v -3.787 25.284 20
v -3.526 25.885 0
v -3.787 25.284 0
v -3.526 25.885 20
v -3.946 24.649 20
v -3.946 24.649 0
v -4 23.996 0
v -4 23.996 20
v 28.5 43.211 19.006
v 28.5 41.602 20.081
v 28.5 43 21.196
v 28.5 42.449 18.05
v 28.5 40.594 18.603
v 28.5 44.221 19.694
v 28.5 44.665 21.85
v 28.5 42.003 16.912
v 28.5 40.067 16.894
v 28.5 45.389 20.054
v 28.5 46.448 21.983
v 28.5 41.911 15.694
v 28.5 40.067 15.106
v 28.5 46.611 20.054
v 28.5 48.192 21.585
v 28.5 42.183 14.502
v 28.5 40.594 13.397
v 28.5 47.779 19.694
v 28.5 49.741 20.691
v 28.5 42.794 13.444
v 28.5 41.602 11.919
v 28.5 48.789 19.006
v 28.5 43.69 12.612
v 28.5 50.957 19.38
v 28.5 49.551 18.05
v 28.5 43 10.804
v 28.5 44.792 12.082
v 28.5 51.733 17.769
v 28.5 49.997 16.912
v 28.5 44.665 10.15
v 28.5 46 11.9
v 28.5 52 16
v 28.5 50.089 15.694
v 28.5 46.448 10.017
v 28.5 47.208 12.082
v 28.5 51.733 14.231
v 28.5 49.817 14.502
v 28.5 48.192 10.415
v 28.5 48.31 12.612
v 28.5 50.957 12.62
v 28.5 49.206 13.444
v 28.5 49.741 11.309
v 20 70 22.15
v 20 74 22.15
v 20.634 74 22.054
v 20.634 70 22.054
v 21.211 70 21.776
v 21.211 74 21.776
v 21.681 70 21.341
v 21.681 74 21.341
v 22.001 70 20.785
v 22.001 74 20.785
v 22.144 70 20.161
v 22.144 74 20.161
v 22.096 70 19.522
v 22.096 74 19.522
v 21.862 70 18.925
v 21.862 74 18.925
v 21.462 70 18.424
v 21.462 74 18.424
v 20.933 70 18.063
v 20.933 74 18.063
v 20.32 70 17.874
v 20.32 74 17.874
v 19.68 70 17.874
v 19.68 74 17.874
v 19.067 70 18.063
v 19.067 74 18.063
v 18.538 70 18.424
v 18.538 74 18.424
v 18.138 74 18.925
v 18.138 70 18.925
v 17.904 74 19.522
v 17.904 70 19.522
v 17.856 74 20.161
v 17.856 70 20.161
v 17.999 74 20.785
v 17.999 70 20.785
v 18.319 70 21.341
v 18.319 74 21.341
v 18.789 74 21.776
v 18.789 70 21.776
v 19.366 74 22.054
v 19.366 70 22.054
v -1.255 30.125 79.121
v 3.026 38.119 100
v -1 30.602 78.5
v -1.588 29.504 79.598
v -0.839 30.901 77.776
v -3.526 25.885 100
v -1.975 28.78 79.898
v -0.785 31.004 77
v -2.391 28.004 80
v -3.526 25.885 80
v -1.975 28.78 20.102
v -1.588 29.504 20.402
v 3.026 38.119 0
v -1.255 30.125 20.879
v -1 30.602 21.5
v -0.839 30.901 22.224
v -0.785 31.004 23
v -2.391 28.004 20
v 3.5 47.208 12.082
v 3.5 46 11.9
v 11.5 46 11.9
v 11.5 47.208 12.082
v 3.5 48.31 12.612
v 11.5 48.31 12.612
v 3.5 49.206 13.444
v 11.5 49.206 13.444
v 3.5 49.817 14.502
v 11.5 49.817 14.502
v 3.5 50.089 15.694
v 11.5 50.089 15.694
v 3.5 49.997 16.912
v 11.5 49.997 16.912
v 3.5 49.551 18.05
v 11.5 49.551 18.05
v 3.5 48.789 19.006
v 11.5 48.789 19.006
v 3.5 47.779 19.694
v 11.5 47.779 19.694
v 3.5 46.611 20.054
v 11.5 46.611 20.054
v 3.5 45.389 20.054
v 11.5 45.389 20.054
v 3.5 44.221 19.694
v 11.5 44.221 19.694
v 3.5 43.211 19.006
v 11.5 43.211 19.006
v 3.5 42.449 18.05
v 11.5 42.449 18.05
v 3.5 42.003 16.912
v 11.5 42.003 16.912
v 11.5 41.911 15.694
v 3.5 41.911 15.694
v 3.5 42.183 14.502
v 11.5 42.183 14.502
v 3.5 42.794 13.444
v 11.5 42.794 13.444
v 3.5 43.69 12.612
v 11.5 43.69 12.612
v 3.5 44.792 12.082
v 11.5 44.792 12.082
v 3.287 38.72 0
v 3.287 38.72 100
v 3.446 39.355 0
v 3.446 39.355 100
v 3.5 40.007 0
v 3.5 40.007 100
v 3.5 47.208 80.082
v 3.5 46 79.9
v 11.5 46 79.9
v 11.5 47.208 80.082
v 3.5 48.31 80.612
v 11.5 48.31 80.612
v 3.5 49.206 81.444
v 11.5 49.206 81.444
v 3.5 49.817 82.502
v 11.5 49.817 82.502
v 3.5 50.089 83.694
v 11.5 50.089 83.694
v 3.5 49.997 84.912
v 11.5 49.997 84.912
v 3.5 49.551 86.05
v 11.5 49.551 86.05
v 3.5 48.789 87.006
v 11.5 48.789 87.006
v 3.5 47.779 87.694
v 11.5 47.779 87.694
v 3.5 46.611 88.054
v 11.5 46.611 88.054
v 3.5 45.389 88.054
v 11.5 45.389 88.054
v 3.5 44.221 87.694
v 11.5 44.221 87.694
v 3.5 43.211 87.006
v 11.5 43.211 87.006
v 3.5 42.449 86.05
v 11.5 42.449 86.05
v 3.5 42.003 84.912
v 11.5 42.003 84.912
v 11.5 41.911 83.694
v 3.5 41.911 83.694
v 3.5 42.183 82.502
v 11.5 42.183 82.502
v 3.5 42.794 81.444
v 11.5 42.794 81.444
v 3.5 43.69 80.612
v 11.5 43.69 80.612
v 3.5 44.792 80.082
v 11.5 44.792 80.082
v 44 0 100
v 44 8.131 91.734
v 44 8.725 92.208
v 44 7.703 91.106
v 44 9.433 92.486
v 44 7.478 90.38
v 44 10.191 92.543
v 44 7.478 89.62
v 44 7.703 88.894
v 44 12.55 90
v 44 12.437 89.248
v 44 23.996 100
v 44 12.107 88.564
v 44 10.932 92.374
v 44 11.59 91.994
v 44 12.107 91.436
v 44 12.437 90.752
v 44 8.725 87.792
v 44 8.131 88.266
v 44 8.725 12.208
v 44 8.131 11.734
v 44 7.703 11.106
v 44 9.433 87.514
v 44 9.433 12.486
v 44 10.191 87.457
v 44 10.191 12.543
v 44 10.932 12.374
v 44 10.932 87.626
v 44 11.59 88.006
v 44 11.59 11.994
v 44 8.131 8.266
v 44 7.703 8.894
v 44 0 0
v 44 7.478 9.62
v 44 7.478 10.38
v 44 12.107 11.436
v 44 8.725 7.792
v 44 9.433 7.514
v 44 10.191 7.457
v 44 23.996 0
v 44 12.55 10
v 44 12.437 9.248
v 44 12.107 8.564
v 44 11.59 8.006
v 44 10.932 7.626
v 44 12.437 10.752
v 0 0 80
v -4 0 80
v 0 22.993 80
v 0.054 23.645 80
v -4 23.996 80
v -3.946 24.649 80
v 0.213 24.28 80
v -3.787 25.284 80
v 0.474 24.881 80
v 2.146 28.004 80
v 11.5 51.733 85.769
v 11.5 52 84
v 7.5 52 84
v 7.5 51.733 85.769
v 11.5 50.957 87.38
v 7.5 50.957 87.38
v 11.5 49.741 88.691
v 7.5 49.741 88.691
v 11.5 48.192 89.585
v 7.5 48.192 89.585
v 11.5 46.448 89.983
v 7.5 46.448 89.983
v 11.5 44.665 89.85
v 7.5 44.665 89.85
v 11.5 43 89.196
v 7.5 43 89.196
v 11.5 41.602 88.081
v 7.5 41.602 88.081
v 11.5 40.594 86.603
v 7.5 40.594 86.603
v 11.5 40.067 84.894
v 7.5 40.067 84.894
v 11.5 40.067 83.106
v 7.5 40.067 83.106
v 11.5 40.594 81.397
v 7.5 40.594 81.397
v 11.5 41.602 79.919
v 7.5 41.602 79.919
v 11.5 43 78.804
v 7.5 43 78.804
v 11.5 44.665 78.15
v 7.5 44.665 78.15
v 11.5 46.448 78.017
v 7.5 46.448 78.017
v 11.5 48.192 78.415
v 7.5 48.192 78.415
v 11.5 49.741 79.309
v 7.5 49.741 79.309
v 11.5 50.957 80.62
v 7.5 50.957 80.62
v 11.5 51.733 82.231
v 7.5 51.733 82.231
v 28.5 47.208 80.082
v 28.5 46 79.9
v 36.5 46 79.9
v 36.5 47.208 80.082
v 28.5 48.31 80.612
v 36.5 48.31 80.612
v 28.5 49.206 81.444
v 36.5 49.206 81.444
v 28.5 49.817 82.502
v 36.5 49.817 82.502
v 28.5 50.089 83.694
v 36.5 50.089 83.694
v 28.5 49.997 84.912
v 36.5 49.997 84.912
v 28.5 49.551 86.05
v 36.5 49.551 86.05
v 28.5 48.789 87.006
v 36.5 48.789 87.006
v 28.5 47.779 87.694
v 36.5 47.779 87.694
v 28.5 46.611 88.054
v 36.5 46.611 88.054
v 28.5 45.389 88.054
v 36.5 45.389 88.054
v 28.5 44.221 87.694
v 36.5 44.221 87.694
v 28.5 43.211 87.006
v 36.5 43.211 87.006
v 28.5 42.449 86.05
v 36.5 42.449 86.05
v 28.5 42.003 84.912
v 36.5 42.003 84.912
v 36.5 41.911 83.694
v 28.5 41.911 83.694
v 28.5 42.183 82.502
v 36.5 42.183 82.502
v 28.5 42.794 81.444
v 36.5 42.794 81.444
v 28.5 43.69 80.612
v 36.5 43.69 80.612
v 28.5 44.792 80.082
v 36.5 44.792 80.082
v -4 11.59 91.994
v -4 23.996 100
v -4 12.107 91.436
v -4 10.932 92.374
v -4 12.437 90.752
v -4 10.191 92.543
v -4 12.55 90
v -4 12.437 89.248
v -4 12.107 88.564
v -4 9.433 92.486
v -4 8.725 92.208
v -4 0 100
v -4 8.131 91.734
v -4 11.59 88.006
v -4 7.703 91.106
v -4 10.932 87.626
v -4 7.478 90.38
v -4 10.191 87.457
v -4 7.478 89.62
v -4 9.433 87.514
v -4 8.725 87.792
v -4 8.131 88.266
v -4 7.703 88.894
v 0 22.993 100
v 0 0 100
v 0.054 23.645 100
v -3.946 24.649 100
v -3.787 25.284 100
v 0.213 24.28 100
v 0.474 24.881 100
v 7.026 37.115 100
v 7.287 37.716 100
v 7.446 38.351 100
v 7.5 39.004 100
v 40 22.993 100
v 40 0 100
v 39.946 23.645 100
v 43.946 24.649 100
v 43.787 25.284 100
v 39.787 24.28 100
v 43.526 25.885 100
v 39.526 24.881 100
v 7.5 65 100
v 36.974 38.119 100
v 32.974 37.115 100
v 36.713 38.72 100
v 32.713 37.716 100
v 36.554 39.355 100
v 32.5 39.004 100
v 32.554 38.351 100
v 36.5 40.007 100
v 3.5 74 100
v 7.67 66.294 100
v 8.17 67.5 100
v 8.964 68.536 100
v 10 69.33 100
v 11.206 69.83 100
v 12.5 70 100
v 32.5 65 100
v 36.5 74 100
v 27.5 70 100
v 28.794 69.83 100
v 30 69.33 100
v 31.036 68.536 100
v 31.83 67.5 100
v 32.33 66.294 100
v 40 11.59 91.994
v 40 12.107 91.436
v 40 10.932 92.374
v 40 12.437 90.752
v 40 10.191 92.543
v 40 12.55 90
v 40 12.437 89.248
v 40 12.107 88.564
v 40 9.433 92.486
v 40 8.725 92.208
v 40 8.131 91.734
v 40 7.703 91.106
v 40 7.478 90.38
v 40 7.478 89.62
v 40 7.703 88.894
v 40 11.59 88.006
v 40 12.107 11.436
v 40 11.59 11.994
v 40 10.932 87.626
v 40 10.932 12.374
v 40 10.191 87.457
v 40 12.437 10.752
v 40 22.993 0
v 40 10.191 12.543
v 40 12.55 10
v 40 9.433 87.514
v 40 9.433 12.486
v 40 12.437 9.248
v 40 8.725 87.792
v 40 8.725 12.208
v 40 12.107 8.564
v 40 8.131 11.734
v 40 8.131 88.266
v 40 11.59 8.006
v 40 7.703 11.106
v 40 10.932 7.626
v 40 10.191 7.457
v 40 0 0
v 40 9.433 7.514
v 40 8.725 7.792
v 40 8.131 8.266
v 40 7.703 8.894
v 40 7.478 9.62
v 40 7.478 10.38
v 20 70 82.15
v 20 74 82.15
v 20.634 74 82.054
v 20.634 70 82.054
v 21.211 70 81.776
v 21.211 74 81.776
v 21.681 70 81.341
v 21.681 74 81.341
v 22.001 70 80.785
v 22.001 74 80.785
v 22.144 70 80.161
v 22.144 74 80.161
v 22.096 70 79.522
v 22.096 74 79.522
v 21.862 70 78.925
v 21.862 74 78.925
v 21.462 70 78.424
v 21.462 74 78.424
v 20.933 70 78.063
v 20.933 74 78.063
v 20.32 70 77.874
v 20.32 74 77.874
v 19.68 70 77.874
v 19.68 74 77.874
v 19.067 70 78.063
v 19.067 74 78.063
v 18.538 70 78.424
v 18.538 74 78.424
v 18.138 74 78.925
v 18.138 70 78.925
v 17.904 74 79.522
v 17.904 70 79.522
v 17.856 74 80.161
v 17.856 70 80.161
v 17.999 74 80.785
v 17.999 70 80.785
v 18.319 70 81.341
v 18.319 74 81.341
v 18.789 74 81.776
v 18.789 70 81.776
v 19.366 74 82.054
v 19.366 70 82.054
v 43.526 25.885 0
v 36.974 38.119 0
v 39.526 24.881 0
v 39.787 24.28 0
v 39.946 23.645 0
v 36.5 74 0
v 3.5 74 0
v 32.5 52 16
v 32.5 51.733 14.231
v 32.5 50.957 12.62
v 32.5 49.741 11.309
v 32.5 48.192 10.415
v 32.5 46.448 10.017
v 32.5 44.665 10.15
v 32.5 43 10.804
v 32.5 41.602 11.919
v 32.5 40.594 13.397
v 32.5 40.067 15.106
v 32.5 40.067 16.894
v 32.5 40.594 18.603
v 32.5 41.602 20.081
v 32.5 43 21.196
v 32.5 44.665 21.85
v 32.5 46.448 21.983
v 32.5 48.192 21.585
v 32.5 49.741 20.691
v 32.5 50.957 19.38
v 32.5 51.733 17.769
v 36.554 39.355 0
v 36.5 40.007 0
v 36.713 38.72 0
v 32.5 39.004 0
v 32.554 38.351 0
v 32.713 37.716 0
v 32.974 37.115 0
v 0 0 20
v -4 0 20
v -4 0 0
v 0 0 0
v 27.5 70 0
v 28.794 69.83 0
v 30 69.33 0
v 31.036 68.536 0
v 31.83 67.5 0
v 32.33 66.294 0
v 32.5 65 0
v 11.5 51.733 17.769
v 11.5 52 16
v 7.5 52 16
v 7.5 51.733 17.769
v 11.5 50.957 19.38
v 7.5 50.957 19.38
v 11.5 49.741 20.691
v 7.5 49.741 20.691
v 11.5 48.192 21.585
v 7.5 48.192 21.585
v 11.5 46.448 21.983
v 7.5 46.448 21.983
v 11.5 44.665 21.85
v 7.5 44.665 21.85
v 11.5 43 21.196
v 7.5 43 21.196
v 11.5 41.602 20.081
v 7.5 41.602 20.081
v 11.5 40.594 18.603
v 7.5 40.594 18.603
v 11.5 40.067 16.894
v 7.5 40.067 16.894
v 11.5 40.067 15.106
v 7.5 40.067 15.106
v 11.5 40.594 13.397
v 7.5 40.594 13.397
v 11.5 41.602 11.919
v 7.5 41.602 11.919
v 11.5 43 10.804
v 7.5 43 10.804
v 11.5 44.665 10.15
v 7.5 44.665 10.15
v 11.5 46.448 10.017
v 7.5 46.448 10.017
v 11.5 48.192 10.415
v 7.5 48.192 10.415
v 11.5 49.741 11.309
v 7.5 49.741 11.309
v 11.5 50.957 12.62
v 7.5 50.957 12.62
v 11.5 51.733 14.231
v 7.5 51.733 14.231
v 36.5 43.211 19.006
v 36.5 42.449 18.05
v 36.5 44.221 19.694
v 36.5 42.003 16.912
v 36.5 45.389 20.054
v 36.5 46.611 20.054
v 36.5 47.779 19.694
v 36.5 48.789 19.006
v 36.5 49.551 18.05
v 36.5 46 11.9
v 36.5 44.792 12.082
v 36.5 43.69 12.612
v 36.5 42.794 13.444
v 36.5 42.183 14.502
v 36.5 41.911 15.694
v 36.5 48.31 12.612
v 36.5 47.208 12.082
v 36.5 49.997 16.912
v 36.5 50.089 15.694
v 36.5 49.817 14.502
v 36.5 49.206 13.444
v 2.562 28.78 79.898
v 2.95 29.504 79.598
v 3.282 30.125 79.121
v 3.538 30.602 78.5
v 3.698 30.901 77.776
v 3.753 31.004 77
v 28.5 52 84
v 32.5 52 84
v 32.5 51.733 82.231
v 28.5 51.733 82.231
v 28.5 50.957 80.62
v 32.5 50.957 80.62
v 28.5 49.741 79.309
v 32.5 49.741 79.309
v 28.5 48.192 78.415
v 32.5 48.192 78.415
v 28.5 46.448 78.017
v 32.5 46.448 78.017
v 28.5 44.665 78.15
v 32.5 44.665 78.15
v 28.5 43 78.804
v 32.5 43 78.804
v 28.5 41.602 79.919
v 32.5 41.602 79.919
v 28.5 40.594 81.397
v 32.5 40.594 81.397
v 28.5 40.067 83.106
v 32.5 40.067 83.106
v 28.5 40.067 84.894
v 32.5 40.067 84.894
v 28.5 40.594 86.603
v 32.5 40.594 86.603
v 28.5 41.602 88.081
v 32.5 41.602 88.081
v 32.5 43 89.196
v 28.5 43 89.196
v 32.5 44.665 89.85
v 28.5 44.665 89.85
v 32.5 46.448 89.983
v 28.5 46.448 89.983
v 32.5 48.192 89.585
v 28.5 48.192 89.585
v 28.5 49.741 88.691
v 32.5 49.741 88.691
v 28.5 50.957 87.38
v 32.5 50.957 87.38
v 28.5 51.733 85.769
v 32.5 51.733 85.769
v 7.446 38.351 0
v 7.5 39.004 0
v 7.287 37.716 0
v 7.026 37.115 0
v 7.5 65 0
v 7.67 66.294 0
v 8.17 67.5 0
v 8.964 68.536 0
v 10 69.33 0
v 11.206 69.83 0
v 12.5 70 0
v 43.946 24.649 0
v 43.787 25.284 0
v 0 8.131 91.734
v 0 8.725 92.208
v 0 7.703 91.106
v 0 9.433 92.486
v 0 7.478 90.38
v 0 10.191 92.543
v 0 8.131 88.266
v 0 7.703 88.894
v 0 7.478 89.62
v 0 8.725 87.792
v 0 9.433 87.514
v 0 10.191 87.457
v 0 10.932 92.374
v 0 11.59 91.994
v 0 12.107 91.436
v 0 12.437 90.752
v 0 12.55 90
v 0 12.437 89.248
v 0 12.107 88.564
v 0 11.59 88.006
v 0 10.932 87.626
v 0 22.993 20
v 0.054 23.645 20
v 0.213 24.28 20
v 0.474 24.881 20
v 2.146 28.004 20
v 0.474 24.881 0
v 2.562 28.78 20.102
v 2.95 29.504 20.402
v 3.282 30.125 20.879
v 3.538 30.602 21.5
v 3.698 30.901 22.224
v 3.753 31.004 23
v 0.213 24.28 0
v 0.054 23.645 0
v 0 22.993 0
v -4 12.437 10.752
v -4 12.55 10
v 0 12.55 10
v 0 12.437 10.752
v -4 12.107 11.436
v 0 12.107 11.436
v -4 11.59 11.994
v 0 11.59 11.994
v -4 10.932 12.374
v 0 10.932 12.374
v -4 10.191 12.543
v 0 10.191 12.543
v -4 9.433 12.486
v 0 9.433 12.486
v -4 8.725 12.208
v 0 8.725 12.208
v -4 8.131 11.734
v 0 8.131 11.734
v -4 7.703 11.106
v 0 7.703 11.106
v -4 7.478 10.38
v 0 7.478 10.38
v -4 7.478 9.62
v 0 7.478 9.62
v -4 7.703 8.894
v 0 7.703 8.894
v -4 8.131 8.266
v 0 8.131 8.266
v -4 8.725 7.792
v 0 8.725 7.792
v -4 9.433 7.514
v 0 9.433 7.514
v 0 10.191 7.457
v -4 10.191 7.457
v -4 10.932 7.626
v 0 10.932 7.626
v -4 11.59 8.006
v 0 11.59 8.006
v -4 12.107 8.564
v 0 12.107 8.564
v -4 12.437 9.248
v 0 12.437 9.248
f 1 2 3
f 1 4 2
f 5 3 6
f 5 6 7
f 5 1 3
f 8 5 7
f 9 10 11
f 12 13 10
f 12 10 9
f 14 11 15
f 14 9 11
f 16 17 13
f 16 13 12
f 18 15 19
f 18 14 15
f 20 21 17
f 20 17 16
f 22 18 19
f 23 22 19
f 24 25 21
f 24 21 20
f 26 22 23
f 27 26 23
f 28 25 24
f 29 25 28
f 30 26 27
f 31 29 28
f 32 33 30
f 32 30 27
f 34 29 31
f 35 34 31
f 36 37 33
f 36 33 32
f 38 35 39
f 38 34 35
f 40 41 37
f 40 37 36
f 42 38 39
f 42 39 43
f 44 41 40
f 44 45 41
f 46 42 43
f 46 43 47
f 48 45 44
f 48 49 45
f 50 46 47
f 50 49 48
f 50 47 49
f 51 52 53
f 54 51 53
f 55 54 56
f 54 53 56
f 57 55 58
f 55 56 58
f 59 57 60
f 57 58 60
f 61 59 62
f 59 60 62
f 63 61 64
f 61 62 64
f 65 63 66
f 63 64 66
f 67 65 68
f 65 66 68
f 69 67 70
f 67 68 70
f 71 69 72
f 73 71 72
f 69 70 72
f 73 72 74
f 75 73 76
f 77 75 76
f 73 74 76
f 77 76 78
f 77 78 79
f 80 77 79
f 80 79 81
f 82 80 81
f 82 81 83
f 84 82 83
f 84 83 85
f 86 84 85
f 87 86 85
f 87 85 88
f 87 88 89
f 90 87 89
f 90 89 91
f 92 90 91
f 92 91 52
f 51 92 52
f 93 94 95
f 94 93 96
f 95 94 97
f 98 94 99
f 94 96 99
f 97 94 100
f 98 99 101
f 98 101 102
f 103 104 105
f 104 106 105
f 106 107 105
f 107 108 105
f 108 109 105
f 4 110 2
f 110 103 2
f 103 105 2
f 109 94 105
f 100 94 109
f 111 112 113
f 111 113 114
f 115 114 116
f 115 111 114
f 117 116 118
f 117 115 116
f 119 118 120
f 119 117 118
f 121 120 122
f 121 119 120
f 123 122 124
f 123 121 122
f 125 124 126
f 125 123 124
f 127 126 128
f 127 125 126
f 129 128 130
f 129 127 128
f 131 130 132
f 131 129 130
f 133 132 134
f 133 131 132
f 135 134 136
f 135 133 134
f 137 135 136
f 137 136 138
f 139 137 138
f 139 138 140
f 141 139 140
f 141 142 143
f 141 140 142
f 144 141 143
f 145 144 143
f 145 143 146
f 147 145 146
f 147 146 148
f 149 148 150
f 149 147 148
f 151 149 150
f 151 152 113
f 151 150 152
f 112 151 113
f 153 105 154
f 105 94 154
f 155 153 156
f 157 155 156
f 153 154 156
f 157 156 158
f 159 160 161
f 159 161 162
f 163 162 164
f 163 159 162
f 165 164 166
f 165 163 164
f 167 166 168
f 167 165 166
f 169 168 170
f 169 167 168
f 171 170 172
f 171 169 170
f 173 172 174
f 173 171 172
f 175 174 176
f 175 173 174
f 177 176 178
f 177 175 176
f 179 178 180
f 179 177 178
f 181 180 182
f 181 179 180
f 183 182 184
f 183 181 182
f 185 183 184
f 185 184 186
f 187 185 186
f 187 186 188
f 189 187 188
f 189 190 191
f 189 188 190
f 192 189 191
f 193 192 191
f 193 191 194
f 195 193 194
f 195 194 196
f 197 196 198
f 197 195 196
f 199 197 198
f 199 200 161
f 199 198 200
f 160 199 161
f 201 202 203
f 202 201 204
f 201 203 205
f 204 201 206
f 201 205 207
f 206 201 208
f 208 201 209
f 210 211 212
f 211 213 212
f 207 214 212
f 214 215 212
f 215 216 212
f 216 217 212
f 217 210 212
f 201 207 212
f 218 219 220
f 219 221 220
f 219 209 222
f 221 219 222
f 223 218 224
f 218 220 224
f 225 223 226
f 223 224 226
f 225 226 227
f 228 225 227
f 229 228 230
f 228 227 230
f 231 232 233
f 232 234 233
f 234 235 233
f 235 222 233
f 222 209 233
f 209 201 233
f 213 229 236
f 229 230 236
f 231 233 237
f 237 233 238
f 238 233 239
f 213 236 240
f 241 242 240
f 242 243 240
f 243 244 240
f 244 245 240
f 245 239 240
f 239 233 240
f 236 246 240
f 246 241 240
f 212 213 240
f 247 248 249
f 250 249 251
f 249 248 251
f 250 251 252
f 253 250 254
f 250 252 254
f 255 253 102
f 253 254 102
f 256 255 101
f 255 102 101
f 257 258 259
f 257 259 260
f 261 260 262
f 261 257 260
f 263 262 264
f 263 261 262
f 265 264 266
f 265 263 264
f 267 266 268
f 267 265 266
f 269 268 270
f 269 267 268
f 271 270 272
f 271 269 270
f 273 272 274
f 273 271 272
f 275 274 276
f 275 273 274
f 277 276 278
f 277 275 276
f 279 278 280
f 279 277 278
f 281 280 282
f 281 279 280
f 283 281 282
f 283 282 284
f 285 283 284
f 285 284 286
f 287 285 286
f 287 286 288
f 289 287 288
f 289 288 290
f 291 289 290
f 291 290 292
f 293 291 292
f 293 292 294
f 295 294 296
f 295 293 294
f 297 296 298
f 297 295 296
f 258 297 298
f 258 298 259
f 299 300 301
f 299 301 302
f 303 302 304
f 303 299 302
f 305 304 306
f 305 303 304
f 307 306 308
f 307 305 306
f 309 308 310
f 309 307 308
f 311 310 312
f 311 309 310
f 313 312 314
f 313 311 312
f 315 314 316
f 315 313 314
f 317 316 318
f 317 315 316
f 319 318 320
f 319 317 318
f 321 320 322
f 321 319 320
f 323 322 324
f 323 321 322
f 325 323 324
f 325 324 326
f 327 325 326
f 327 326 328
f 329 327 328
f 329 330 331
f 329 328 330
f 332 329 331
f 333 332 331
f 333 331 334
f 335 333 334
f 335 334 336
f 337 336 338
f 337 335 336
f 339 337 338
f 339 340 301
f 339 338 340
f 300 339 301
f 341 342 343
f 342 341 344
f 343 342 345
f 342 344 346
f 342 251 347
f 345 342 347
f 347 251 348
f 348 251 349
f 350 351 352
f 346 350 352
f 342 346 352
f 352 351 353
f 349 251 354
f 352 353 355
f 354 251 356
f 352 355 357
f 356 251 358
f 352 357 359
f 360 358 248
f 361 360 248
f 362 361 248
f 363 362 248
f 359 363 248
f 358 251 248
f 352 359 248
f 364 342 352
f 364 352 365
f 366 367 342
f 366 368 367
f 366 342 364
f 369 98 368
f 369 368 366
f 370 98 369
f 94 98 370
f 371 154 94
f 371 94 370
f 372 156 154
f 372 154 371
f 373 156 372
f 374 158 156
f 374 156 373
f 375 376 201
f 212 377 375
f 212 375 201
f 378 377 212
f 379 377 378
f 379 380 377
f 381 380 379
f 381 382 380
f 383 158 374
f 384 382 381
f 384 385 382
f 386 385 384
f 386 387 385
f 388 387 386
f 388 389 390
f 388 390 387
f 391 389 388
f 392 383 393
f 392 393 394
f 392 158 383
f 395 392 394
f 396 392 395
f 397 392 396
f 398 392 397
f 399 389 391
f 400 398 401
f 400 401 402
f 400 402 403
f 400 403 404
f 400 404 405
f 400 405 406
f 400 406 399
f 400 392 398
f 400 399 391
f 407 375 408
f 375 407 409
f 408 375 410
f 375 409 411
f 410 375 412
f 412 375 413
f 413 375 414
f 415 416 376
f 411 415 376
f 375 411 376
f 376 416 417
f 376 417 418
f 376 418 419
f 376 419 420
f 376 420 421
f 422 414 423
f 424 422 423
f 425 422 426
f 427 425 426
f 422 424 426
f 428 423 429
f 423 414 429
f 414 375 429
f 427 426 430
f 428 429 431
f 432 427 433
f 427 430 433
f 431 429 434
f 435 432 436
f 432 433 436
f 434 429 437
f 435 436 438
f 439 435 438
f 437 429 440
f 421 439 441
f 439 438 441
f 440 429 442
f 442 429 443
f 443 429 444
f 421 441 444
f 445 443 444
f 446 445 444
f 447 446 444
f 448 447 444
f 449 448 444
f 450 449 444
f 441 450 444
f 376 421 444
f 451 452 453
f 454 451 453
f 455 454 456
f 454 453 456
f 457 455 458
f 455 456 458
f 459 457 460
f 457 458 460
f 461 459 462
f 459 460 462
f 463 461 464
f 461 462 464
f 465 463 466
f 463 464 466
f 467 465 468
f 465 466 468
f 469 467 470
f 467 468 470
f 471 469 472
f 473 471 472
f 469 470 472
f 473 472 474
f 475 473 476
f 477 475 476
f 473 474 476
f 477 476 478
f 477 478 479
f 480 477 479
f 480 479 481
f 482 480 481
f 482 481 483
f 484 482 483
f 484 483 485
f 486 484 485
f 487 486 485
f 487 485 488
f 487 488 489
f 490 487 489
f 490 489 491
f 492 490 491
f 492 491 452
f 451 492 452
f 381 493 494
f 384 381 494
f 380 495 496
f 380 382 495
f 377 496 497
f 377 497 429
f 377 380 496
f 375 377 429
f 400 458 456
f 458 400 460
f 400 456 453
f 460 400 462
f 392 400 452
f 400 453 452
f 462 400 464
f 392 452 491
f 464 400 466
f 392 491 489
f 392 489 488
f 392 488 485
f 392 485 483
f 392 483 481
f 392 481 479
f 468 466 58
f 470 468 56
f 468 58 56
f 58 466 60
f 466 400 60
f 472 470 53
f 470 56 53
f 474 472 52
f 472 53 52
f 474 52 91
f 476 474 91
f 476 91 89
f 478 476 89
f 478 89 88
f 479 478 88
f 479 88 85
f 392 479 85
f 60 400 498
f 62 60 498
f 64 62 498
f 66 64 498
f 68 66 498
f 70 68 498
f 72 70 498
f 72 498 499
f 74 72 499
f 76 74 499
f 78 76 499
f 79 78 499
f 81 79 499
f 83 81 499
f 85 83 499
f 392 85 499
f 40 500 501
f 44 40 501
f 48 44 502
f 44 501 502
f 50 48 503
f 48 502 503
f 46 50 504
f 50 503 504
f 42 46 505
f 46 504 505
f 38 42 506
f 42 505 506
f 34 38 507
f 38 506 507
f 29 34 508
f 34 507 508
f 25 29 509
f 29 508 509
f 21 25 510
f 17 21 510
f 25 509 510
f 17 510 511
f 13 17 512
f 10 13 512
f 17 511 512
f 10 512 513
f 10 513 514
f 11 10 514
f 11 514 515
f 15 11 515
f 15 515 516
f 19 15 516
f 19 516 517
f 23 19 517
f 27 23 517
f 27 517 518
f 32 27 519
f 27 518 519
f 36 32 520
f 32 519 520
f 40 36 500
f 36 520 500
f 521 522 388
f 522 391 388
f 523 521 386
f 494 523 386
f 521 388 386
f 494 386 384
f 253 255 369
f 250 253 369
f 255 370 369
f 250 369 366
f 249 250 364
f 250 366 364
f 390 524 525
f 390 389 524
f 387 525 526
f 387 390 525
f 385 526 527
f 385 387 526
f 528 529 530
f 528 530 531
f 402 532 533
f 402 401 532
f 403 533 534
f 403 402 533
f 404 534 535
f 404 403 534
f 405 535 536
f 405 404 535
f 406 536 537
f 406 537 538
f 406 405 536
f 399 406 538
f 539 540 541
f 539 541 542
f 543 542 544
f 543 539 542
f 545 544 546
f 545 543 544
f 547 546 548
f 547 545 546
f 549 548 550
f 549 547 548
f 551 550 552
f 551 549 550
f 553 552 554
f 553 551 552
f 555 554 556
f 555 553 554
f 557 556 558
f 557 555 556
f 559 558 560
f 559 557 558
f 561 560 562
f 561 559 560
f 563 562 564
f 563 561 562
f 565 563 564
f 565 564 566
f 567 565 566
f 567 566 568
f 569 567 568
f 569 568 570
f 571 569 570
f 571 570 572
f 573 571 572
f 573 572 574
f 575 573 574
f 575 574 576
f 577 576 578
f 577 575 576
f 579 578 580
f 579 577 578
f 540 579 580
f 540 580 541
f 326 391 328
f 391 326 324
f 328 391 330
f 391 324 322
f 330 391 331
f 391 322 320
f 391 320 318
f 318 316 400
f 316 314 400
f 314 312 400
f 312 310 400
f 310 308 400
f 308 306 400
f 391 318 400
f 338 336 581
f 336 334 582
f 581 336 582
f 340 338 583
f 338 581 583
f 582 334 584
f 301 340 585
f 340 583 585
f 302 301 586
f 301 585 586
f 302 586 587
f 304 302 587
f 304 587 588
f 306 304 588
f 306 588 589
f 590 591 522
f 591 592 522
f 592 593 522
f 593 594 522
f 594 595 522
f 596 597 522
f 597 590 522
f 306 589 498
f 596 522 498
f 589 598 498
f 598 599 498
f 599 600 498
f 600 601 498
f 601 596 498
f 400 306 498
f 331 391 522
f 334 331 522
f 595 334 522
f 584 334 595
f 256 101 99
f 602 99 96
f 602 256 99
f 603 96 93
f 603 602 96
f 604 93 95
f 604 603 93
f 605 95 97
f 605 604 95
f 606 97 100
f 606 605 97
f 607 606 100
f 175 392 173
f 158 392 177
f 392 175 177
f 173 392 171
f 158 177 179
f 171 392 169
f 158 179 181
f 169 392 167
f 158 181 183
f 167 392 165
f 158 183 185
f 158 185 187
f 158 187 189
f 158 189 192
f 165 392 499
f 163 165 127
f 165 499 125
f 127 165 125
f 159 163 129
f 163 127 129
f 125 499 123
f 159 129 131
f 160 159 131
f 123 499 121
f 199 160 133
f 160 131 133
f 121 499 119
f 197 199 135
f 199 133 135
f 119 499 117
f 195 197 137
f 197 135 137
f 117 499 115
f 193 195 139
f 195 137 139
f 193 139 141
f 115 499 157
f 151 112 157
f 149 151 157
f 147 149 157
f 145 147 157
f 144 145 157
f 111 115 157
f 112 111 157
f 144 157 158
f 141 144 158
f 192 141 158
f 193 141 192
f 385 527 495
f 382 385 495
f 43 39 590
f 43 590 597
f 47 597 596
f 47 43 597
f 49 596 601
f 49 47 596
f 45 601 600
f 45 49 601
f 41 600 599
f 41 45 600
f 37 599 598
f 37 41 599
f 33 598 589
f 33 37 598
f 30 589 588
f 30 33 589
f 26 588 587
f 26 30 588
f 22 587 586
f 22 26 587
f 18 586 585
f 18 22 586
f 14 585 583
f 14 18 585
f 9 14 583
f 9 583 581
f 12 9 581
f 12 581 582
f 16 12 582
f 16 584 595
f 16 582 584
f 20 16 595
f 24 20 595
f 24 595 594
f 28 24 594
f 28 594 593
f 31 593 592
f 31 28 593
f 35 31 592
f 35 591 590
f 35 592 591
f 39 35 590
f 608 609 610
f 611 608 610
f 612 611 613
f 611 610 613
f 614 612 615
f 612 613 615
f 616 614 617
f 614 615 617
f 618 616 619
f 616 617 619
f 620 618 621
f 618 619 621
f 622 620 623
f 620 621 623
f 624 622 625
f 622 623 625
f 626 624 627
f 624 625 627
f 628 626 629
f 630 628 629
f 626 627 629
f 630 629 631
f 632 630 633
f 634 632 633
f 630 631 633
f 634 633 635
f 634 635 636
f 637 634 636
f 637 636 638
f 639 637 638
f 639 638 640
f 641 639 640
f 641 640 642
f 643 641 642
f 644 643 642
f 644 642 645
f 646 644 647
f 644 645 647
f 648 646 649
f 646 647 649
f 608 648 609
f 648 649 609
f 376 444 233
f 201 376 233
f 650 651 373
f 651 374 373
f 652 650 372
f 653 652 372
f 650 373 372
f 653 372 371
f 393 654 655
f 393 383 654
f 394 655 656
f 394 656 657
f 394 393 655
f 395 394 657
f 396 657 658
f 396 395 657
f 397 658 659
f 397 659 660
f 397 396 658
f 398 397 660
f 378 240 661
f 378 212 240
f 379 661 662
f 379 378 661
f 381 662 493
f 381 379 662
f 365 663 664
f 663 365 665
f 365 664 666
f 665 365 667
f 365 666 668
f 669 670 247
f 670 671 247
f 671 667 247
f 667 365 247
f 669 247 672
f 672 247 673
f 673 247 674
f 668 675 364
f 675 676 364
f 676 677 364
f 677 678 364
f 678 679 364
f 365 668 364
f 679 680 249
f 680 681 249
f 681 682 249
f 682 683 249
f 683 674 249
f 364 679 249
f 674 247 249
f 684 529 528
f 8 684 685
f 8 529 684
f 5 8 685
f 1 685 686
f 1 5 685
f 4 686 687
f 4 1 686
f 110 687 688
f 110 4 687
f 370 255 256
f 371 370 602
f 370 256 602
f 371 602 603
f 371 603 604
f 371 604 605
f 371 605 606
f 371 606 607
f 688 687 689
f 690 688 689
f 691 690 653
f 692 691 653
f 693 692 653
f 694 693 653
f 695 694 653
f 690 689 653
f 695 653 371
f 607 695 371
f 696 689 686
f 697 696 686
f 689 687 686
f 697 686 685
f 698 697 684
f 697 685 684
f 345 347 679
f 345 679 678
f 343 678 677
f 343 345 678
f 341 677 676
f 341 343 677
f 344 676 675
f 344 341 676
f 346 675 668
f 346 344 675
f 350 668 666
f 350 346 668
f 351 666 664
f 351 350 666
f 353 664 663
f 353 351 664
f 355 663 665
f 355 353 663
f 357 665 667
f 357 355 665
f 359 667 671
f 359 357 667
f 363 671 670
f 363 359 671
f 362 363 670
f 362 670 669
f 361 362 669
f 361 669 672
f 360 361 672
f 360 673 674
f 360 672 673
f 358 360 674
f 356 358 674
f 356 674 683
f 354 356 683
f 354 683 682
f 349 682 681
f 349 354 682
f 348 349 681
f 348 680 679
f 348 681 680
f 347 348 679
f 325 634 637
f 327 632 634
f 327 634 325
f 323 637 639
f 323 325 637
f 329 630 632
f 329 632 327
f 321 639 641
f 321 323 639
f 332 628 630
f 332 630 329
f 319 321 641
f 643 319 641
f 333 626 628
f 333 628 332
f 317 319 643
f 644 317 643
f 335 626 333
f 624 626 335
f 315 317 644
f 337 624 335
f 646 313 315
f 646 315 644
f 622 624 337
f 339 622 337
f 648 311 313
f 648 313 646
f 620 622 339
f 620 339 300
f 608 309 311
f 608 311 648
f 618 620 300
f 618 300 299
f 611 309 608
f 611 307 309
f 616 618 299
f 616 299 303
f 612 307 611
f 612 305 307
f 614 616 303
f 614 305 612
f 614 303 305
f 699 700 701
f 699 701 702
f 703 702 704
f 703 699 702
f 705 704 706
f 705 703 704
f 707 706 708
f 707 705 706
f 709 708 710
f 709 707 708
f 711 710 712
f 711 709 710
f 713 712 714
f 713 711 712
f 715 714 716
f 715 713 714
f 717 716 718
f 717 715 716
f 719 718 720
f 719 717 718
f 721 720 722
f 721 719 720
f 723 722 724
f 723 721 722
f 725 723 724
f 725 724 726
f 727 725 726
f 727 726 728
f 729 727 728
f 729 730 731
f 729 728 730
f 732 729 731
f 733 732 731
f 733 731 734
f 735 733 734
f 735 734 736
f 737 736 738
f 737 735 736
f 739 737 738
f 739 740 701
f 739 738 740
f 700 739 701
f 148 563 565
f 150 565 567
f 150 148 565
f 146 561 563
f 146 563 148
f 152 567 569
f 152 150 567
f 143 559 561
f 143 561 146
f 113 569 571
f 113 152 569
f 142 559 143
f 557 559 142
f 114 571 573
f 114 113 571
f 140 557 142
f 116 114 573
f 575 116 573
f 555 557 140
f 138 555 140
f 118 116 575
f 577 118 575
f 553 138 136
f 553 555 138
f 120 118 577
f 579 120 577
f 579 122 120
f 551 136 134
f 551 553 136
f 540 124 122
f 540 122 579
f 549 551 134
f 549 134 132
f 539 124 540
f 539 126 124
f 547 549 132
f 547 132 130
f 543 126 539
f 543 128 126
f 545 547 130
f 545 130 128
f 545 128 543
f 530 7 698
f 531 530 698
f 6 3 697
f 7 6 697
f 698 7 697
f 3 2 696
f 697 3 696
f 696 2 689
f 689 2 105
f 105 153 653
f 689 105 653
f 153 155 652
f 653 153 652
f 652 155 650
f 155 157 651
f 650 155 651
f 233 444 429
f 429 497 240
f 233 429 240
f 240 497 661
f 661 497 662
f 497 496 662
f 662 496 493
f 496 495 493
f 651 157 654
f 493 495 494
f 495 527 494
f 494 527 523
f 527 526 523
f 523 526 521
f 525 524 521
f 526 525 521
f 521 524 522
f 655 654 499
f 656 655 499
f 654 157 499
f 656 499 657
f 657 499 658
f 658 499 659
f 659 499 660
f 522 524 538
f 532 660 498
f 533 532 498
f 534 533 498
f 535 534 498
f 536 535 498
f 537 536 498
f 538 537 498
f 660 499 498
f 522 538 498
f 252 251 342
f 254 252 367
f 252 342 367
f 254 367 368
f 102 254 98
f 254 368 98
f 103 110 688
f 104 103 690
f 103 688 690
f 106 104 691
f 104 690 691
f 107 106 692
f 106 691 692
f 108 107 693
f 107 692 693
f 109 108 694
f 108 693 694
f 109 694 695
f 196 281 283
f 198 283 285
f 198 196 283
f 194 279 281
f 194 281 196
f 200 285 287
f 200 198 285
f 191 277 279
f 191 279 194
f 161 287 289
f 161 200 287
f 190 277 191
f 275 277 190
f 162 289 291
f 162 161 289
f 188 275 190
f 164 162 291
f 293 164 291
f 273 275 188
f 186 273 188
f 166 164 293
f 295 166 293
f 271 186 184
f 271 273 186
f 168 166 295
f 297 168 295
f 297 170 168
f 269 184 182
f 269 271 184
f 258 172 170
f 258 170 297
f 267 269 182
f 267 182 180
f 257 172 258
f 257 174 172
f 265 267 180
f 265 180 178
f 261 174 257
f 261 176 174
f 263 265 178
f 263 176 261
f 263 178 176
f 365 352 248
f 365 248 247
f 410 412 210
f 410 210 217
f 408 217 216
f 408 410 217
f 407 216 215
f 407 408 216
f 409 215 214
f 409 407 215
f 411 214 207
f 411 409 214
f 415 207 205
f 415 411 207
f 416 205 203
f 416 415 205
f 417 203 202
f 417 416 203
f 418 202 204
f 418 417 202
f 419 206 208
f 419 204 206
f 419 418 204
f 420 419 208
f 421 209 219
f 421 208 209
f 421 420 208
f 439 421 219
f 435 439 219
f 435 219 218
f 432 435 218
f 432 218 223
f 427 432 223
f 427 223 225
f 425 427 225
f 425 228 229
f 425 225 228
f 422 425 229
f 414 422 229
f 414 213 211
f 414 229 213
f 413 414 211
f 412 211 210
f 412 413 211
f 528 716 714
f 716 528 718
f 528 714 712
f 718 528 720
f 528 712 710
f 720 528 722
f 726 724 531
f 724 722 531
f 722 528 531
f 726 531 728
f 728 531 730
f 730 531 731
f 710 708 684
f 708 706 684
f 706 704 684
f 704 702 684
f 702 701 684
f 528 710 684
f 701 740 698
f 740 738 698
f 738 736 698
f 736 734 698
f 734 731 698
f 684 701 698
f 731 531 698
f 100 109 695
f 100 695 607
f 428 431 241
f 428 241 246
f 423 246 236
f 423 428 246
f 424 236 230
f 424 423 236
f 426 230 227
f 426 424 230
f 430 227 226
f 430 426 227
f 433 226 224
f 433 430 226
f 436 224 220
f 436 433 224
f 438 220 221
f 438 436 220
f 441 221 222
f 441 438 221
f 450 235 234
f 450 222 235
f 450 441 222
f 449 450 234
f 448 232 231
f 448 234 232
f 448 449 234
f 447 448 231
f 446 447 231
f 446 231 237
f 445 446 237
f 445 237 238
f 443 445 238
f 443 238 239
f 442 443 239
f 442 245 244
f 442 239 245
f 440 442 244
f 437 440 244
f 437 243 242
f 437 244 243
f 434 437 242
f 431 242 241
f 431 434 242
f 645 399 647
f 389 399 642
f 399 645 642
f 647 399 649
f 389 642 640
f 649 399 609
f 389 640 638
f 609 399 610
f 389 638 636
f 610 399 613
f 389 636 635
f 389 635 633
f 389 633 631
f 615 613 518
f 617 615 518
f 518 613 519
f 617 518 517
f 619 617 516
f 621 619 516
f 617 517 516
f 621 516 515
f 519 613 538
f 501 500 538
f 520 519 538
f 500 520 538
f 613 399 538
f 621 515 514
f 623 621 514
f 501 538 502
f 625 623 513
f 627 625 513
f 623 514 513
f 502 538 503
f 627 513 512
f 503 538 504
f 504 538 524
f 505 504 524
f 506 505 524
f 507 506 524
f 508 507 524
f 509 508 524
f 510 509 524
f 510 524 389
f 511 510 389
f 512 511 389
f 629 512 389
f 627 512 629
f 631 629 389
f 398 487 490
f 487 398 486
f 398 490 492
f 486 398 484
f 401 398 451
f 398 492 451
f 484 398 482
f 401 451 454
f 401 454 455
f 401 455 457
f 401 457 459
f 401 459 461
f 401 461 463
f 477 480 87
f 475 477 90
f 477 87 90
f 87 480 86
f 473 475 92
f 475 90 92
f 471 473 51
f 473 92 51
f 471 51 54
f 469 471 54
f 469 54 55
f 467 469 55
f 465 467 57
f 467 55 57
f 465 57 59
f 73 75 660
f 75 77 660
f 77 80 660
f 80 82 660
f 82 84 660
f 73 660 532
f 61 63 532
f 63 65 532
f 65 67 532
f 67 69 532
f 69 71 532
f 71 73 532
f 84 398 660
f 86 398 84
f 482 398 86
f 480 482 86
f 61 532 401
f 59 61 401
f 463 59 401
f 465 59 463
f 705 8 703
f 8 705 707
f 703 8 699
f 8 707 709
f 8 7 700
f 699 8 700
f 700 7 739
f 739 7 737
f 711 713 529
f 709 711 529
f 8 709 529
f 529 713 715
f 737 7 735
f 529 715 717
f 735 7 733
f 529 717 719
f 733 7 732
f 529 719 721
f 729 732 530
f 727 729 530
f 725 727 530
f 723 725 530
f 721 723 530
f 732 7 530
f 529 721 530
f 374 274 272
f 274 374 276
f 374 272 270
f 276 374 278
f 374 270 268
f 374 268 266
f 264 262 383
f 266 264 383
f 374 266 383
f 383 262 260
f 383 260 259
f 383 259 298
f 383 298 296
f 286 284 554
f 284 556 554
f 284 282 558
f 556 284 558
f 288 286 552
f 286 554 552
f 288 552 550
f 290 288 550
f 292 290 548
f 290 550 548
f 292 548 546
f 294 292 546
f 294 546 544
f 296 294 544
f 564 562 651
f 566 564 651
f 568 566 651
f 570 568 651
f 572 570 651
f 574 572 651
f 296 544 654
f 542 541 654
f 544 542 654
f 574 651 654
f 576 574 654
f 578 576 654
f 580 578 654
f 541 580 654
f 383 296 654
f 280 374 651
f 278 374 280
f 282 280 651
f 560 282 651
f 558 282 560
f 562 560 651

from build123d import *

# Parameters (mm, degrees)
BOSS_EXTRUDE1_DEPTH     = 100
SKETCH3_R               = 6
BOSS_EXTRUDE2_DEPTH     = 4
BOSS_EXTRUDE3_START     = 4
SKETCH4_R               = 6
BOSS_EXTRUDE3_DEPTH     = 4
CUT_EXTRUDE1_DEPTH      = 130.646635128
CUT_EXTRUDE1_DEPTH_BACK = 130.646635128
SKETCH9_R               = 4.1
CUT_EXTRUDE2_DEPTH      = 134.341666406
CUT_EXTRUDE2_DEPTH_BACK = 134.341666406
SKETCH10_R              = 2.55
SKETCH13_W              = 60
SKETCH13_H              = 31.00370213
CUT_EXTRUDE5_DEPTH      = 24
FILLET1_R               = 3
FILLET2_R               = 5
FILLET3_R               = 4
SKETCH15_R              = 2.15
CUT_EXTRUDE6_DEPTH      = 132.954537626


with BuildPart() as part:
    # Sketch2 → Boss-Extrude1 (new body)
    with BuildSketch(Plane.XY):
        Polygon((0, 0), (0, 23.99629787), (7.5, 38), (7.5, 70), (32.5, 70), (32.5, 38), (40, 23.99629787), (40, 0), (44, 0), (44, 25), (36.5, 39.00370213), (36.5, 74), (3.5, 74), (3.5, 39.00370213), (-4, 25), (-4, 0), align=None)
    extrude(amount=BOSS_EXTRUDE1_DEPTH)

    # Sketch3 → Boss-Extrude2 (add)
    with BuildSketch(Plane.ZY.offset(-32.5)):
        with Locations(Location((84, 46, 0), (0, 0, 90))):
            Circle(SKETCH3_R)
        with Locations(Location((16, 46, 0), (0, 0, 90))):
            Circle(SKETCH3_R)
    extrude(amount=BOSS_EXTRUDE2_DEPTH)

    # Sketch4 → Boss-Extrude3 (add)
    with BuildSketch(Plane(origin=(7.5, 0, 0), x_dir=(0, 0, -1), z_dir=(1, 0, 0)).offset(BOSS_EXTRUDE3_START)):
        with Locations(Location((-16, 46, 0), (0, 0, 90))):
            Circle(SKETCH4_R)
        with Locations(Location((-84, 46, 0), (0, 0, 90))):
            Circle(SKETCH4_R)
    extrude(amount=-BOSS_EXTRUDE3_DEPTH)

    # Sketch9 → Cut-Extrude1 (cut, two sides: drawn at the far end of the back side and taken through both)
    with BuildSketch(Plane(origin=(7.5, 0, 0), x_dir=(0, 0, -1), z_dir=(1, 0, 0)).offset(-CUT_EXTRUDE1_DEPTH_BACK)):
        with Locations((-16, 46)):
            Circle(SKETCH9_R)
        with Locations((-84, 46)):
            Circle(SKETCH9_R)
    extrude(amount=CUT_EXTRUDE1_DEPTH + CUT_EXTRUDE1_DEPTH_BACK, mode=Mode.SUBTRACT)

    # Sketch10 → Cut-Extrude2 (cut, two sides: drawn at the far end of the back side and taken through both)
    with BuildSketch(Plane(origin=(44, 0, 0), x_dir=(0, 0, -1), z_dir=(1, 0, 0)).offset(-CUT_EXTRUDE2_DEPTH_BACK)):
        with Locations(Location((-10, 10, 0), (0, 0, 90))):
            Circle(SKETCH10_R)
        with Locations(Location((-90, 10, 0), (0, 0, 90))):
            Circle(SKETCH10_R)
    extrude(amount=CUT_EXTRUDE2_DEPTH + CUT_EXTRUDE2_DEPTH_BACK, mode=Mode.SUBTRACT)

    # Sketch13 → Cut-Extrude5 (cut)
    with BuildSketch(Plane.ZY.offset(4)):
        with Locations((50, 15.501851065)):
            Rectangle(SKETCH13_W, SKETCH13_H)
    extrude(amount=-CUT_EXTRUDE5_DEPTH, mode=Mode.SUBTRACT)

    # Fillet1
    fillet1_edges = [part.edges().sort_by_distance(p)[0] for p in [
        (1.48419643, 31.00370213, 20),
        (1.48419643, 31.00370213, 80),
    ]]
    fillet(fillet1_edges, radius=FILLET1_R)

    # Fillet2
    fillet2_edges = [part.edges().sort_by_distance(p)[0] for p in [
        (32.5, 70, 50),
        (7.5, 70, 50),
    ]]
    fillet(fillet2_edges, radius=FILLET2_R)

    # Fillet3
    fillet3_edges = [part.edges().sort_by_distance(p)[0] for p in [
        (-4, 25, 10),
        (0, 23.99629787, 10),
        (-4, 25, 90),
        (3.5, 39.00370213, 50),
        (36.5, 39.00370213, 50),
        (44, 25, 50),
        (40, 23.99629787, 50),
        (32.5, 38, 50),
        (7.5, 38, 50),
        (0, 23.99629787, 90),
    ]]
    fillet(fillet3_edges, radius=FILLET3_R)

    # Sketch15 → Cut-Extrude6 (cut, through all)
    with BuildSketch(Plane(origin=(0, 74, 0), x_dir=(1, 0, 0), z_dir=(0, 1, 0))):
        with Locations(Location((20, -20, 0), (0, 0, 270))):
            Circle(SKETCH15_R)
        with Locations(Location((20, -80, 0), (0, 0, 270))):
            Circle(SKETCH15_R)
    extrude(amount=-CUT_EXTRUDE6_DEPTH, mode=Mode.SUBTRACT)


solid = part.part
